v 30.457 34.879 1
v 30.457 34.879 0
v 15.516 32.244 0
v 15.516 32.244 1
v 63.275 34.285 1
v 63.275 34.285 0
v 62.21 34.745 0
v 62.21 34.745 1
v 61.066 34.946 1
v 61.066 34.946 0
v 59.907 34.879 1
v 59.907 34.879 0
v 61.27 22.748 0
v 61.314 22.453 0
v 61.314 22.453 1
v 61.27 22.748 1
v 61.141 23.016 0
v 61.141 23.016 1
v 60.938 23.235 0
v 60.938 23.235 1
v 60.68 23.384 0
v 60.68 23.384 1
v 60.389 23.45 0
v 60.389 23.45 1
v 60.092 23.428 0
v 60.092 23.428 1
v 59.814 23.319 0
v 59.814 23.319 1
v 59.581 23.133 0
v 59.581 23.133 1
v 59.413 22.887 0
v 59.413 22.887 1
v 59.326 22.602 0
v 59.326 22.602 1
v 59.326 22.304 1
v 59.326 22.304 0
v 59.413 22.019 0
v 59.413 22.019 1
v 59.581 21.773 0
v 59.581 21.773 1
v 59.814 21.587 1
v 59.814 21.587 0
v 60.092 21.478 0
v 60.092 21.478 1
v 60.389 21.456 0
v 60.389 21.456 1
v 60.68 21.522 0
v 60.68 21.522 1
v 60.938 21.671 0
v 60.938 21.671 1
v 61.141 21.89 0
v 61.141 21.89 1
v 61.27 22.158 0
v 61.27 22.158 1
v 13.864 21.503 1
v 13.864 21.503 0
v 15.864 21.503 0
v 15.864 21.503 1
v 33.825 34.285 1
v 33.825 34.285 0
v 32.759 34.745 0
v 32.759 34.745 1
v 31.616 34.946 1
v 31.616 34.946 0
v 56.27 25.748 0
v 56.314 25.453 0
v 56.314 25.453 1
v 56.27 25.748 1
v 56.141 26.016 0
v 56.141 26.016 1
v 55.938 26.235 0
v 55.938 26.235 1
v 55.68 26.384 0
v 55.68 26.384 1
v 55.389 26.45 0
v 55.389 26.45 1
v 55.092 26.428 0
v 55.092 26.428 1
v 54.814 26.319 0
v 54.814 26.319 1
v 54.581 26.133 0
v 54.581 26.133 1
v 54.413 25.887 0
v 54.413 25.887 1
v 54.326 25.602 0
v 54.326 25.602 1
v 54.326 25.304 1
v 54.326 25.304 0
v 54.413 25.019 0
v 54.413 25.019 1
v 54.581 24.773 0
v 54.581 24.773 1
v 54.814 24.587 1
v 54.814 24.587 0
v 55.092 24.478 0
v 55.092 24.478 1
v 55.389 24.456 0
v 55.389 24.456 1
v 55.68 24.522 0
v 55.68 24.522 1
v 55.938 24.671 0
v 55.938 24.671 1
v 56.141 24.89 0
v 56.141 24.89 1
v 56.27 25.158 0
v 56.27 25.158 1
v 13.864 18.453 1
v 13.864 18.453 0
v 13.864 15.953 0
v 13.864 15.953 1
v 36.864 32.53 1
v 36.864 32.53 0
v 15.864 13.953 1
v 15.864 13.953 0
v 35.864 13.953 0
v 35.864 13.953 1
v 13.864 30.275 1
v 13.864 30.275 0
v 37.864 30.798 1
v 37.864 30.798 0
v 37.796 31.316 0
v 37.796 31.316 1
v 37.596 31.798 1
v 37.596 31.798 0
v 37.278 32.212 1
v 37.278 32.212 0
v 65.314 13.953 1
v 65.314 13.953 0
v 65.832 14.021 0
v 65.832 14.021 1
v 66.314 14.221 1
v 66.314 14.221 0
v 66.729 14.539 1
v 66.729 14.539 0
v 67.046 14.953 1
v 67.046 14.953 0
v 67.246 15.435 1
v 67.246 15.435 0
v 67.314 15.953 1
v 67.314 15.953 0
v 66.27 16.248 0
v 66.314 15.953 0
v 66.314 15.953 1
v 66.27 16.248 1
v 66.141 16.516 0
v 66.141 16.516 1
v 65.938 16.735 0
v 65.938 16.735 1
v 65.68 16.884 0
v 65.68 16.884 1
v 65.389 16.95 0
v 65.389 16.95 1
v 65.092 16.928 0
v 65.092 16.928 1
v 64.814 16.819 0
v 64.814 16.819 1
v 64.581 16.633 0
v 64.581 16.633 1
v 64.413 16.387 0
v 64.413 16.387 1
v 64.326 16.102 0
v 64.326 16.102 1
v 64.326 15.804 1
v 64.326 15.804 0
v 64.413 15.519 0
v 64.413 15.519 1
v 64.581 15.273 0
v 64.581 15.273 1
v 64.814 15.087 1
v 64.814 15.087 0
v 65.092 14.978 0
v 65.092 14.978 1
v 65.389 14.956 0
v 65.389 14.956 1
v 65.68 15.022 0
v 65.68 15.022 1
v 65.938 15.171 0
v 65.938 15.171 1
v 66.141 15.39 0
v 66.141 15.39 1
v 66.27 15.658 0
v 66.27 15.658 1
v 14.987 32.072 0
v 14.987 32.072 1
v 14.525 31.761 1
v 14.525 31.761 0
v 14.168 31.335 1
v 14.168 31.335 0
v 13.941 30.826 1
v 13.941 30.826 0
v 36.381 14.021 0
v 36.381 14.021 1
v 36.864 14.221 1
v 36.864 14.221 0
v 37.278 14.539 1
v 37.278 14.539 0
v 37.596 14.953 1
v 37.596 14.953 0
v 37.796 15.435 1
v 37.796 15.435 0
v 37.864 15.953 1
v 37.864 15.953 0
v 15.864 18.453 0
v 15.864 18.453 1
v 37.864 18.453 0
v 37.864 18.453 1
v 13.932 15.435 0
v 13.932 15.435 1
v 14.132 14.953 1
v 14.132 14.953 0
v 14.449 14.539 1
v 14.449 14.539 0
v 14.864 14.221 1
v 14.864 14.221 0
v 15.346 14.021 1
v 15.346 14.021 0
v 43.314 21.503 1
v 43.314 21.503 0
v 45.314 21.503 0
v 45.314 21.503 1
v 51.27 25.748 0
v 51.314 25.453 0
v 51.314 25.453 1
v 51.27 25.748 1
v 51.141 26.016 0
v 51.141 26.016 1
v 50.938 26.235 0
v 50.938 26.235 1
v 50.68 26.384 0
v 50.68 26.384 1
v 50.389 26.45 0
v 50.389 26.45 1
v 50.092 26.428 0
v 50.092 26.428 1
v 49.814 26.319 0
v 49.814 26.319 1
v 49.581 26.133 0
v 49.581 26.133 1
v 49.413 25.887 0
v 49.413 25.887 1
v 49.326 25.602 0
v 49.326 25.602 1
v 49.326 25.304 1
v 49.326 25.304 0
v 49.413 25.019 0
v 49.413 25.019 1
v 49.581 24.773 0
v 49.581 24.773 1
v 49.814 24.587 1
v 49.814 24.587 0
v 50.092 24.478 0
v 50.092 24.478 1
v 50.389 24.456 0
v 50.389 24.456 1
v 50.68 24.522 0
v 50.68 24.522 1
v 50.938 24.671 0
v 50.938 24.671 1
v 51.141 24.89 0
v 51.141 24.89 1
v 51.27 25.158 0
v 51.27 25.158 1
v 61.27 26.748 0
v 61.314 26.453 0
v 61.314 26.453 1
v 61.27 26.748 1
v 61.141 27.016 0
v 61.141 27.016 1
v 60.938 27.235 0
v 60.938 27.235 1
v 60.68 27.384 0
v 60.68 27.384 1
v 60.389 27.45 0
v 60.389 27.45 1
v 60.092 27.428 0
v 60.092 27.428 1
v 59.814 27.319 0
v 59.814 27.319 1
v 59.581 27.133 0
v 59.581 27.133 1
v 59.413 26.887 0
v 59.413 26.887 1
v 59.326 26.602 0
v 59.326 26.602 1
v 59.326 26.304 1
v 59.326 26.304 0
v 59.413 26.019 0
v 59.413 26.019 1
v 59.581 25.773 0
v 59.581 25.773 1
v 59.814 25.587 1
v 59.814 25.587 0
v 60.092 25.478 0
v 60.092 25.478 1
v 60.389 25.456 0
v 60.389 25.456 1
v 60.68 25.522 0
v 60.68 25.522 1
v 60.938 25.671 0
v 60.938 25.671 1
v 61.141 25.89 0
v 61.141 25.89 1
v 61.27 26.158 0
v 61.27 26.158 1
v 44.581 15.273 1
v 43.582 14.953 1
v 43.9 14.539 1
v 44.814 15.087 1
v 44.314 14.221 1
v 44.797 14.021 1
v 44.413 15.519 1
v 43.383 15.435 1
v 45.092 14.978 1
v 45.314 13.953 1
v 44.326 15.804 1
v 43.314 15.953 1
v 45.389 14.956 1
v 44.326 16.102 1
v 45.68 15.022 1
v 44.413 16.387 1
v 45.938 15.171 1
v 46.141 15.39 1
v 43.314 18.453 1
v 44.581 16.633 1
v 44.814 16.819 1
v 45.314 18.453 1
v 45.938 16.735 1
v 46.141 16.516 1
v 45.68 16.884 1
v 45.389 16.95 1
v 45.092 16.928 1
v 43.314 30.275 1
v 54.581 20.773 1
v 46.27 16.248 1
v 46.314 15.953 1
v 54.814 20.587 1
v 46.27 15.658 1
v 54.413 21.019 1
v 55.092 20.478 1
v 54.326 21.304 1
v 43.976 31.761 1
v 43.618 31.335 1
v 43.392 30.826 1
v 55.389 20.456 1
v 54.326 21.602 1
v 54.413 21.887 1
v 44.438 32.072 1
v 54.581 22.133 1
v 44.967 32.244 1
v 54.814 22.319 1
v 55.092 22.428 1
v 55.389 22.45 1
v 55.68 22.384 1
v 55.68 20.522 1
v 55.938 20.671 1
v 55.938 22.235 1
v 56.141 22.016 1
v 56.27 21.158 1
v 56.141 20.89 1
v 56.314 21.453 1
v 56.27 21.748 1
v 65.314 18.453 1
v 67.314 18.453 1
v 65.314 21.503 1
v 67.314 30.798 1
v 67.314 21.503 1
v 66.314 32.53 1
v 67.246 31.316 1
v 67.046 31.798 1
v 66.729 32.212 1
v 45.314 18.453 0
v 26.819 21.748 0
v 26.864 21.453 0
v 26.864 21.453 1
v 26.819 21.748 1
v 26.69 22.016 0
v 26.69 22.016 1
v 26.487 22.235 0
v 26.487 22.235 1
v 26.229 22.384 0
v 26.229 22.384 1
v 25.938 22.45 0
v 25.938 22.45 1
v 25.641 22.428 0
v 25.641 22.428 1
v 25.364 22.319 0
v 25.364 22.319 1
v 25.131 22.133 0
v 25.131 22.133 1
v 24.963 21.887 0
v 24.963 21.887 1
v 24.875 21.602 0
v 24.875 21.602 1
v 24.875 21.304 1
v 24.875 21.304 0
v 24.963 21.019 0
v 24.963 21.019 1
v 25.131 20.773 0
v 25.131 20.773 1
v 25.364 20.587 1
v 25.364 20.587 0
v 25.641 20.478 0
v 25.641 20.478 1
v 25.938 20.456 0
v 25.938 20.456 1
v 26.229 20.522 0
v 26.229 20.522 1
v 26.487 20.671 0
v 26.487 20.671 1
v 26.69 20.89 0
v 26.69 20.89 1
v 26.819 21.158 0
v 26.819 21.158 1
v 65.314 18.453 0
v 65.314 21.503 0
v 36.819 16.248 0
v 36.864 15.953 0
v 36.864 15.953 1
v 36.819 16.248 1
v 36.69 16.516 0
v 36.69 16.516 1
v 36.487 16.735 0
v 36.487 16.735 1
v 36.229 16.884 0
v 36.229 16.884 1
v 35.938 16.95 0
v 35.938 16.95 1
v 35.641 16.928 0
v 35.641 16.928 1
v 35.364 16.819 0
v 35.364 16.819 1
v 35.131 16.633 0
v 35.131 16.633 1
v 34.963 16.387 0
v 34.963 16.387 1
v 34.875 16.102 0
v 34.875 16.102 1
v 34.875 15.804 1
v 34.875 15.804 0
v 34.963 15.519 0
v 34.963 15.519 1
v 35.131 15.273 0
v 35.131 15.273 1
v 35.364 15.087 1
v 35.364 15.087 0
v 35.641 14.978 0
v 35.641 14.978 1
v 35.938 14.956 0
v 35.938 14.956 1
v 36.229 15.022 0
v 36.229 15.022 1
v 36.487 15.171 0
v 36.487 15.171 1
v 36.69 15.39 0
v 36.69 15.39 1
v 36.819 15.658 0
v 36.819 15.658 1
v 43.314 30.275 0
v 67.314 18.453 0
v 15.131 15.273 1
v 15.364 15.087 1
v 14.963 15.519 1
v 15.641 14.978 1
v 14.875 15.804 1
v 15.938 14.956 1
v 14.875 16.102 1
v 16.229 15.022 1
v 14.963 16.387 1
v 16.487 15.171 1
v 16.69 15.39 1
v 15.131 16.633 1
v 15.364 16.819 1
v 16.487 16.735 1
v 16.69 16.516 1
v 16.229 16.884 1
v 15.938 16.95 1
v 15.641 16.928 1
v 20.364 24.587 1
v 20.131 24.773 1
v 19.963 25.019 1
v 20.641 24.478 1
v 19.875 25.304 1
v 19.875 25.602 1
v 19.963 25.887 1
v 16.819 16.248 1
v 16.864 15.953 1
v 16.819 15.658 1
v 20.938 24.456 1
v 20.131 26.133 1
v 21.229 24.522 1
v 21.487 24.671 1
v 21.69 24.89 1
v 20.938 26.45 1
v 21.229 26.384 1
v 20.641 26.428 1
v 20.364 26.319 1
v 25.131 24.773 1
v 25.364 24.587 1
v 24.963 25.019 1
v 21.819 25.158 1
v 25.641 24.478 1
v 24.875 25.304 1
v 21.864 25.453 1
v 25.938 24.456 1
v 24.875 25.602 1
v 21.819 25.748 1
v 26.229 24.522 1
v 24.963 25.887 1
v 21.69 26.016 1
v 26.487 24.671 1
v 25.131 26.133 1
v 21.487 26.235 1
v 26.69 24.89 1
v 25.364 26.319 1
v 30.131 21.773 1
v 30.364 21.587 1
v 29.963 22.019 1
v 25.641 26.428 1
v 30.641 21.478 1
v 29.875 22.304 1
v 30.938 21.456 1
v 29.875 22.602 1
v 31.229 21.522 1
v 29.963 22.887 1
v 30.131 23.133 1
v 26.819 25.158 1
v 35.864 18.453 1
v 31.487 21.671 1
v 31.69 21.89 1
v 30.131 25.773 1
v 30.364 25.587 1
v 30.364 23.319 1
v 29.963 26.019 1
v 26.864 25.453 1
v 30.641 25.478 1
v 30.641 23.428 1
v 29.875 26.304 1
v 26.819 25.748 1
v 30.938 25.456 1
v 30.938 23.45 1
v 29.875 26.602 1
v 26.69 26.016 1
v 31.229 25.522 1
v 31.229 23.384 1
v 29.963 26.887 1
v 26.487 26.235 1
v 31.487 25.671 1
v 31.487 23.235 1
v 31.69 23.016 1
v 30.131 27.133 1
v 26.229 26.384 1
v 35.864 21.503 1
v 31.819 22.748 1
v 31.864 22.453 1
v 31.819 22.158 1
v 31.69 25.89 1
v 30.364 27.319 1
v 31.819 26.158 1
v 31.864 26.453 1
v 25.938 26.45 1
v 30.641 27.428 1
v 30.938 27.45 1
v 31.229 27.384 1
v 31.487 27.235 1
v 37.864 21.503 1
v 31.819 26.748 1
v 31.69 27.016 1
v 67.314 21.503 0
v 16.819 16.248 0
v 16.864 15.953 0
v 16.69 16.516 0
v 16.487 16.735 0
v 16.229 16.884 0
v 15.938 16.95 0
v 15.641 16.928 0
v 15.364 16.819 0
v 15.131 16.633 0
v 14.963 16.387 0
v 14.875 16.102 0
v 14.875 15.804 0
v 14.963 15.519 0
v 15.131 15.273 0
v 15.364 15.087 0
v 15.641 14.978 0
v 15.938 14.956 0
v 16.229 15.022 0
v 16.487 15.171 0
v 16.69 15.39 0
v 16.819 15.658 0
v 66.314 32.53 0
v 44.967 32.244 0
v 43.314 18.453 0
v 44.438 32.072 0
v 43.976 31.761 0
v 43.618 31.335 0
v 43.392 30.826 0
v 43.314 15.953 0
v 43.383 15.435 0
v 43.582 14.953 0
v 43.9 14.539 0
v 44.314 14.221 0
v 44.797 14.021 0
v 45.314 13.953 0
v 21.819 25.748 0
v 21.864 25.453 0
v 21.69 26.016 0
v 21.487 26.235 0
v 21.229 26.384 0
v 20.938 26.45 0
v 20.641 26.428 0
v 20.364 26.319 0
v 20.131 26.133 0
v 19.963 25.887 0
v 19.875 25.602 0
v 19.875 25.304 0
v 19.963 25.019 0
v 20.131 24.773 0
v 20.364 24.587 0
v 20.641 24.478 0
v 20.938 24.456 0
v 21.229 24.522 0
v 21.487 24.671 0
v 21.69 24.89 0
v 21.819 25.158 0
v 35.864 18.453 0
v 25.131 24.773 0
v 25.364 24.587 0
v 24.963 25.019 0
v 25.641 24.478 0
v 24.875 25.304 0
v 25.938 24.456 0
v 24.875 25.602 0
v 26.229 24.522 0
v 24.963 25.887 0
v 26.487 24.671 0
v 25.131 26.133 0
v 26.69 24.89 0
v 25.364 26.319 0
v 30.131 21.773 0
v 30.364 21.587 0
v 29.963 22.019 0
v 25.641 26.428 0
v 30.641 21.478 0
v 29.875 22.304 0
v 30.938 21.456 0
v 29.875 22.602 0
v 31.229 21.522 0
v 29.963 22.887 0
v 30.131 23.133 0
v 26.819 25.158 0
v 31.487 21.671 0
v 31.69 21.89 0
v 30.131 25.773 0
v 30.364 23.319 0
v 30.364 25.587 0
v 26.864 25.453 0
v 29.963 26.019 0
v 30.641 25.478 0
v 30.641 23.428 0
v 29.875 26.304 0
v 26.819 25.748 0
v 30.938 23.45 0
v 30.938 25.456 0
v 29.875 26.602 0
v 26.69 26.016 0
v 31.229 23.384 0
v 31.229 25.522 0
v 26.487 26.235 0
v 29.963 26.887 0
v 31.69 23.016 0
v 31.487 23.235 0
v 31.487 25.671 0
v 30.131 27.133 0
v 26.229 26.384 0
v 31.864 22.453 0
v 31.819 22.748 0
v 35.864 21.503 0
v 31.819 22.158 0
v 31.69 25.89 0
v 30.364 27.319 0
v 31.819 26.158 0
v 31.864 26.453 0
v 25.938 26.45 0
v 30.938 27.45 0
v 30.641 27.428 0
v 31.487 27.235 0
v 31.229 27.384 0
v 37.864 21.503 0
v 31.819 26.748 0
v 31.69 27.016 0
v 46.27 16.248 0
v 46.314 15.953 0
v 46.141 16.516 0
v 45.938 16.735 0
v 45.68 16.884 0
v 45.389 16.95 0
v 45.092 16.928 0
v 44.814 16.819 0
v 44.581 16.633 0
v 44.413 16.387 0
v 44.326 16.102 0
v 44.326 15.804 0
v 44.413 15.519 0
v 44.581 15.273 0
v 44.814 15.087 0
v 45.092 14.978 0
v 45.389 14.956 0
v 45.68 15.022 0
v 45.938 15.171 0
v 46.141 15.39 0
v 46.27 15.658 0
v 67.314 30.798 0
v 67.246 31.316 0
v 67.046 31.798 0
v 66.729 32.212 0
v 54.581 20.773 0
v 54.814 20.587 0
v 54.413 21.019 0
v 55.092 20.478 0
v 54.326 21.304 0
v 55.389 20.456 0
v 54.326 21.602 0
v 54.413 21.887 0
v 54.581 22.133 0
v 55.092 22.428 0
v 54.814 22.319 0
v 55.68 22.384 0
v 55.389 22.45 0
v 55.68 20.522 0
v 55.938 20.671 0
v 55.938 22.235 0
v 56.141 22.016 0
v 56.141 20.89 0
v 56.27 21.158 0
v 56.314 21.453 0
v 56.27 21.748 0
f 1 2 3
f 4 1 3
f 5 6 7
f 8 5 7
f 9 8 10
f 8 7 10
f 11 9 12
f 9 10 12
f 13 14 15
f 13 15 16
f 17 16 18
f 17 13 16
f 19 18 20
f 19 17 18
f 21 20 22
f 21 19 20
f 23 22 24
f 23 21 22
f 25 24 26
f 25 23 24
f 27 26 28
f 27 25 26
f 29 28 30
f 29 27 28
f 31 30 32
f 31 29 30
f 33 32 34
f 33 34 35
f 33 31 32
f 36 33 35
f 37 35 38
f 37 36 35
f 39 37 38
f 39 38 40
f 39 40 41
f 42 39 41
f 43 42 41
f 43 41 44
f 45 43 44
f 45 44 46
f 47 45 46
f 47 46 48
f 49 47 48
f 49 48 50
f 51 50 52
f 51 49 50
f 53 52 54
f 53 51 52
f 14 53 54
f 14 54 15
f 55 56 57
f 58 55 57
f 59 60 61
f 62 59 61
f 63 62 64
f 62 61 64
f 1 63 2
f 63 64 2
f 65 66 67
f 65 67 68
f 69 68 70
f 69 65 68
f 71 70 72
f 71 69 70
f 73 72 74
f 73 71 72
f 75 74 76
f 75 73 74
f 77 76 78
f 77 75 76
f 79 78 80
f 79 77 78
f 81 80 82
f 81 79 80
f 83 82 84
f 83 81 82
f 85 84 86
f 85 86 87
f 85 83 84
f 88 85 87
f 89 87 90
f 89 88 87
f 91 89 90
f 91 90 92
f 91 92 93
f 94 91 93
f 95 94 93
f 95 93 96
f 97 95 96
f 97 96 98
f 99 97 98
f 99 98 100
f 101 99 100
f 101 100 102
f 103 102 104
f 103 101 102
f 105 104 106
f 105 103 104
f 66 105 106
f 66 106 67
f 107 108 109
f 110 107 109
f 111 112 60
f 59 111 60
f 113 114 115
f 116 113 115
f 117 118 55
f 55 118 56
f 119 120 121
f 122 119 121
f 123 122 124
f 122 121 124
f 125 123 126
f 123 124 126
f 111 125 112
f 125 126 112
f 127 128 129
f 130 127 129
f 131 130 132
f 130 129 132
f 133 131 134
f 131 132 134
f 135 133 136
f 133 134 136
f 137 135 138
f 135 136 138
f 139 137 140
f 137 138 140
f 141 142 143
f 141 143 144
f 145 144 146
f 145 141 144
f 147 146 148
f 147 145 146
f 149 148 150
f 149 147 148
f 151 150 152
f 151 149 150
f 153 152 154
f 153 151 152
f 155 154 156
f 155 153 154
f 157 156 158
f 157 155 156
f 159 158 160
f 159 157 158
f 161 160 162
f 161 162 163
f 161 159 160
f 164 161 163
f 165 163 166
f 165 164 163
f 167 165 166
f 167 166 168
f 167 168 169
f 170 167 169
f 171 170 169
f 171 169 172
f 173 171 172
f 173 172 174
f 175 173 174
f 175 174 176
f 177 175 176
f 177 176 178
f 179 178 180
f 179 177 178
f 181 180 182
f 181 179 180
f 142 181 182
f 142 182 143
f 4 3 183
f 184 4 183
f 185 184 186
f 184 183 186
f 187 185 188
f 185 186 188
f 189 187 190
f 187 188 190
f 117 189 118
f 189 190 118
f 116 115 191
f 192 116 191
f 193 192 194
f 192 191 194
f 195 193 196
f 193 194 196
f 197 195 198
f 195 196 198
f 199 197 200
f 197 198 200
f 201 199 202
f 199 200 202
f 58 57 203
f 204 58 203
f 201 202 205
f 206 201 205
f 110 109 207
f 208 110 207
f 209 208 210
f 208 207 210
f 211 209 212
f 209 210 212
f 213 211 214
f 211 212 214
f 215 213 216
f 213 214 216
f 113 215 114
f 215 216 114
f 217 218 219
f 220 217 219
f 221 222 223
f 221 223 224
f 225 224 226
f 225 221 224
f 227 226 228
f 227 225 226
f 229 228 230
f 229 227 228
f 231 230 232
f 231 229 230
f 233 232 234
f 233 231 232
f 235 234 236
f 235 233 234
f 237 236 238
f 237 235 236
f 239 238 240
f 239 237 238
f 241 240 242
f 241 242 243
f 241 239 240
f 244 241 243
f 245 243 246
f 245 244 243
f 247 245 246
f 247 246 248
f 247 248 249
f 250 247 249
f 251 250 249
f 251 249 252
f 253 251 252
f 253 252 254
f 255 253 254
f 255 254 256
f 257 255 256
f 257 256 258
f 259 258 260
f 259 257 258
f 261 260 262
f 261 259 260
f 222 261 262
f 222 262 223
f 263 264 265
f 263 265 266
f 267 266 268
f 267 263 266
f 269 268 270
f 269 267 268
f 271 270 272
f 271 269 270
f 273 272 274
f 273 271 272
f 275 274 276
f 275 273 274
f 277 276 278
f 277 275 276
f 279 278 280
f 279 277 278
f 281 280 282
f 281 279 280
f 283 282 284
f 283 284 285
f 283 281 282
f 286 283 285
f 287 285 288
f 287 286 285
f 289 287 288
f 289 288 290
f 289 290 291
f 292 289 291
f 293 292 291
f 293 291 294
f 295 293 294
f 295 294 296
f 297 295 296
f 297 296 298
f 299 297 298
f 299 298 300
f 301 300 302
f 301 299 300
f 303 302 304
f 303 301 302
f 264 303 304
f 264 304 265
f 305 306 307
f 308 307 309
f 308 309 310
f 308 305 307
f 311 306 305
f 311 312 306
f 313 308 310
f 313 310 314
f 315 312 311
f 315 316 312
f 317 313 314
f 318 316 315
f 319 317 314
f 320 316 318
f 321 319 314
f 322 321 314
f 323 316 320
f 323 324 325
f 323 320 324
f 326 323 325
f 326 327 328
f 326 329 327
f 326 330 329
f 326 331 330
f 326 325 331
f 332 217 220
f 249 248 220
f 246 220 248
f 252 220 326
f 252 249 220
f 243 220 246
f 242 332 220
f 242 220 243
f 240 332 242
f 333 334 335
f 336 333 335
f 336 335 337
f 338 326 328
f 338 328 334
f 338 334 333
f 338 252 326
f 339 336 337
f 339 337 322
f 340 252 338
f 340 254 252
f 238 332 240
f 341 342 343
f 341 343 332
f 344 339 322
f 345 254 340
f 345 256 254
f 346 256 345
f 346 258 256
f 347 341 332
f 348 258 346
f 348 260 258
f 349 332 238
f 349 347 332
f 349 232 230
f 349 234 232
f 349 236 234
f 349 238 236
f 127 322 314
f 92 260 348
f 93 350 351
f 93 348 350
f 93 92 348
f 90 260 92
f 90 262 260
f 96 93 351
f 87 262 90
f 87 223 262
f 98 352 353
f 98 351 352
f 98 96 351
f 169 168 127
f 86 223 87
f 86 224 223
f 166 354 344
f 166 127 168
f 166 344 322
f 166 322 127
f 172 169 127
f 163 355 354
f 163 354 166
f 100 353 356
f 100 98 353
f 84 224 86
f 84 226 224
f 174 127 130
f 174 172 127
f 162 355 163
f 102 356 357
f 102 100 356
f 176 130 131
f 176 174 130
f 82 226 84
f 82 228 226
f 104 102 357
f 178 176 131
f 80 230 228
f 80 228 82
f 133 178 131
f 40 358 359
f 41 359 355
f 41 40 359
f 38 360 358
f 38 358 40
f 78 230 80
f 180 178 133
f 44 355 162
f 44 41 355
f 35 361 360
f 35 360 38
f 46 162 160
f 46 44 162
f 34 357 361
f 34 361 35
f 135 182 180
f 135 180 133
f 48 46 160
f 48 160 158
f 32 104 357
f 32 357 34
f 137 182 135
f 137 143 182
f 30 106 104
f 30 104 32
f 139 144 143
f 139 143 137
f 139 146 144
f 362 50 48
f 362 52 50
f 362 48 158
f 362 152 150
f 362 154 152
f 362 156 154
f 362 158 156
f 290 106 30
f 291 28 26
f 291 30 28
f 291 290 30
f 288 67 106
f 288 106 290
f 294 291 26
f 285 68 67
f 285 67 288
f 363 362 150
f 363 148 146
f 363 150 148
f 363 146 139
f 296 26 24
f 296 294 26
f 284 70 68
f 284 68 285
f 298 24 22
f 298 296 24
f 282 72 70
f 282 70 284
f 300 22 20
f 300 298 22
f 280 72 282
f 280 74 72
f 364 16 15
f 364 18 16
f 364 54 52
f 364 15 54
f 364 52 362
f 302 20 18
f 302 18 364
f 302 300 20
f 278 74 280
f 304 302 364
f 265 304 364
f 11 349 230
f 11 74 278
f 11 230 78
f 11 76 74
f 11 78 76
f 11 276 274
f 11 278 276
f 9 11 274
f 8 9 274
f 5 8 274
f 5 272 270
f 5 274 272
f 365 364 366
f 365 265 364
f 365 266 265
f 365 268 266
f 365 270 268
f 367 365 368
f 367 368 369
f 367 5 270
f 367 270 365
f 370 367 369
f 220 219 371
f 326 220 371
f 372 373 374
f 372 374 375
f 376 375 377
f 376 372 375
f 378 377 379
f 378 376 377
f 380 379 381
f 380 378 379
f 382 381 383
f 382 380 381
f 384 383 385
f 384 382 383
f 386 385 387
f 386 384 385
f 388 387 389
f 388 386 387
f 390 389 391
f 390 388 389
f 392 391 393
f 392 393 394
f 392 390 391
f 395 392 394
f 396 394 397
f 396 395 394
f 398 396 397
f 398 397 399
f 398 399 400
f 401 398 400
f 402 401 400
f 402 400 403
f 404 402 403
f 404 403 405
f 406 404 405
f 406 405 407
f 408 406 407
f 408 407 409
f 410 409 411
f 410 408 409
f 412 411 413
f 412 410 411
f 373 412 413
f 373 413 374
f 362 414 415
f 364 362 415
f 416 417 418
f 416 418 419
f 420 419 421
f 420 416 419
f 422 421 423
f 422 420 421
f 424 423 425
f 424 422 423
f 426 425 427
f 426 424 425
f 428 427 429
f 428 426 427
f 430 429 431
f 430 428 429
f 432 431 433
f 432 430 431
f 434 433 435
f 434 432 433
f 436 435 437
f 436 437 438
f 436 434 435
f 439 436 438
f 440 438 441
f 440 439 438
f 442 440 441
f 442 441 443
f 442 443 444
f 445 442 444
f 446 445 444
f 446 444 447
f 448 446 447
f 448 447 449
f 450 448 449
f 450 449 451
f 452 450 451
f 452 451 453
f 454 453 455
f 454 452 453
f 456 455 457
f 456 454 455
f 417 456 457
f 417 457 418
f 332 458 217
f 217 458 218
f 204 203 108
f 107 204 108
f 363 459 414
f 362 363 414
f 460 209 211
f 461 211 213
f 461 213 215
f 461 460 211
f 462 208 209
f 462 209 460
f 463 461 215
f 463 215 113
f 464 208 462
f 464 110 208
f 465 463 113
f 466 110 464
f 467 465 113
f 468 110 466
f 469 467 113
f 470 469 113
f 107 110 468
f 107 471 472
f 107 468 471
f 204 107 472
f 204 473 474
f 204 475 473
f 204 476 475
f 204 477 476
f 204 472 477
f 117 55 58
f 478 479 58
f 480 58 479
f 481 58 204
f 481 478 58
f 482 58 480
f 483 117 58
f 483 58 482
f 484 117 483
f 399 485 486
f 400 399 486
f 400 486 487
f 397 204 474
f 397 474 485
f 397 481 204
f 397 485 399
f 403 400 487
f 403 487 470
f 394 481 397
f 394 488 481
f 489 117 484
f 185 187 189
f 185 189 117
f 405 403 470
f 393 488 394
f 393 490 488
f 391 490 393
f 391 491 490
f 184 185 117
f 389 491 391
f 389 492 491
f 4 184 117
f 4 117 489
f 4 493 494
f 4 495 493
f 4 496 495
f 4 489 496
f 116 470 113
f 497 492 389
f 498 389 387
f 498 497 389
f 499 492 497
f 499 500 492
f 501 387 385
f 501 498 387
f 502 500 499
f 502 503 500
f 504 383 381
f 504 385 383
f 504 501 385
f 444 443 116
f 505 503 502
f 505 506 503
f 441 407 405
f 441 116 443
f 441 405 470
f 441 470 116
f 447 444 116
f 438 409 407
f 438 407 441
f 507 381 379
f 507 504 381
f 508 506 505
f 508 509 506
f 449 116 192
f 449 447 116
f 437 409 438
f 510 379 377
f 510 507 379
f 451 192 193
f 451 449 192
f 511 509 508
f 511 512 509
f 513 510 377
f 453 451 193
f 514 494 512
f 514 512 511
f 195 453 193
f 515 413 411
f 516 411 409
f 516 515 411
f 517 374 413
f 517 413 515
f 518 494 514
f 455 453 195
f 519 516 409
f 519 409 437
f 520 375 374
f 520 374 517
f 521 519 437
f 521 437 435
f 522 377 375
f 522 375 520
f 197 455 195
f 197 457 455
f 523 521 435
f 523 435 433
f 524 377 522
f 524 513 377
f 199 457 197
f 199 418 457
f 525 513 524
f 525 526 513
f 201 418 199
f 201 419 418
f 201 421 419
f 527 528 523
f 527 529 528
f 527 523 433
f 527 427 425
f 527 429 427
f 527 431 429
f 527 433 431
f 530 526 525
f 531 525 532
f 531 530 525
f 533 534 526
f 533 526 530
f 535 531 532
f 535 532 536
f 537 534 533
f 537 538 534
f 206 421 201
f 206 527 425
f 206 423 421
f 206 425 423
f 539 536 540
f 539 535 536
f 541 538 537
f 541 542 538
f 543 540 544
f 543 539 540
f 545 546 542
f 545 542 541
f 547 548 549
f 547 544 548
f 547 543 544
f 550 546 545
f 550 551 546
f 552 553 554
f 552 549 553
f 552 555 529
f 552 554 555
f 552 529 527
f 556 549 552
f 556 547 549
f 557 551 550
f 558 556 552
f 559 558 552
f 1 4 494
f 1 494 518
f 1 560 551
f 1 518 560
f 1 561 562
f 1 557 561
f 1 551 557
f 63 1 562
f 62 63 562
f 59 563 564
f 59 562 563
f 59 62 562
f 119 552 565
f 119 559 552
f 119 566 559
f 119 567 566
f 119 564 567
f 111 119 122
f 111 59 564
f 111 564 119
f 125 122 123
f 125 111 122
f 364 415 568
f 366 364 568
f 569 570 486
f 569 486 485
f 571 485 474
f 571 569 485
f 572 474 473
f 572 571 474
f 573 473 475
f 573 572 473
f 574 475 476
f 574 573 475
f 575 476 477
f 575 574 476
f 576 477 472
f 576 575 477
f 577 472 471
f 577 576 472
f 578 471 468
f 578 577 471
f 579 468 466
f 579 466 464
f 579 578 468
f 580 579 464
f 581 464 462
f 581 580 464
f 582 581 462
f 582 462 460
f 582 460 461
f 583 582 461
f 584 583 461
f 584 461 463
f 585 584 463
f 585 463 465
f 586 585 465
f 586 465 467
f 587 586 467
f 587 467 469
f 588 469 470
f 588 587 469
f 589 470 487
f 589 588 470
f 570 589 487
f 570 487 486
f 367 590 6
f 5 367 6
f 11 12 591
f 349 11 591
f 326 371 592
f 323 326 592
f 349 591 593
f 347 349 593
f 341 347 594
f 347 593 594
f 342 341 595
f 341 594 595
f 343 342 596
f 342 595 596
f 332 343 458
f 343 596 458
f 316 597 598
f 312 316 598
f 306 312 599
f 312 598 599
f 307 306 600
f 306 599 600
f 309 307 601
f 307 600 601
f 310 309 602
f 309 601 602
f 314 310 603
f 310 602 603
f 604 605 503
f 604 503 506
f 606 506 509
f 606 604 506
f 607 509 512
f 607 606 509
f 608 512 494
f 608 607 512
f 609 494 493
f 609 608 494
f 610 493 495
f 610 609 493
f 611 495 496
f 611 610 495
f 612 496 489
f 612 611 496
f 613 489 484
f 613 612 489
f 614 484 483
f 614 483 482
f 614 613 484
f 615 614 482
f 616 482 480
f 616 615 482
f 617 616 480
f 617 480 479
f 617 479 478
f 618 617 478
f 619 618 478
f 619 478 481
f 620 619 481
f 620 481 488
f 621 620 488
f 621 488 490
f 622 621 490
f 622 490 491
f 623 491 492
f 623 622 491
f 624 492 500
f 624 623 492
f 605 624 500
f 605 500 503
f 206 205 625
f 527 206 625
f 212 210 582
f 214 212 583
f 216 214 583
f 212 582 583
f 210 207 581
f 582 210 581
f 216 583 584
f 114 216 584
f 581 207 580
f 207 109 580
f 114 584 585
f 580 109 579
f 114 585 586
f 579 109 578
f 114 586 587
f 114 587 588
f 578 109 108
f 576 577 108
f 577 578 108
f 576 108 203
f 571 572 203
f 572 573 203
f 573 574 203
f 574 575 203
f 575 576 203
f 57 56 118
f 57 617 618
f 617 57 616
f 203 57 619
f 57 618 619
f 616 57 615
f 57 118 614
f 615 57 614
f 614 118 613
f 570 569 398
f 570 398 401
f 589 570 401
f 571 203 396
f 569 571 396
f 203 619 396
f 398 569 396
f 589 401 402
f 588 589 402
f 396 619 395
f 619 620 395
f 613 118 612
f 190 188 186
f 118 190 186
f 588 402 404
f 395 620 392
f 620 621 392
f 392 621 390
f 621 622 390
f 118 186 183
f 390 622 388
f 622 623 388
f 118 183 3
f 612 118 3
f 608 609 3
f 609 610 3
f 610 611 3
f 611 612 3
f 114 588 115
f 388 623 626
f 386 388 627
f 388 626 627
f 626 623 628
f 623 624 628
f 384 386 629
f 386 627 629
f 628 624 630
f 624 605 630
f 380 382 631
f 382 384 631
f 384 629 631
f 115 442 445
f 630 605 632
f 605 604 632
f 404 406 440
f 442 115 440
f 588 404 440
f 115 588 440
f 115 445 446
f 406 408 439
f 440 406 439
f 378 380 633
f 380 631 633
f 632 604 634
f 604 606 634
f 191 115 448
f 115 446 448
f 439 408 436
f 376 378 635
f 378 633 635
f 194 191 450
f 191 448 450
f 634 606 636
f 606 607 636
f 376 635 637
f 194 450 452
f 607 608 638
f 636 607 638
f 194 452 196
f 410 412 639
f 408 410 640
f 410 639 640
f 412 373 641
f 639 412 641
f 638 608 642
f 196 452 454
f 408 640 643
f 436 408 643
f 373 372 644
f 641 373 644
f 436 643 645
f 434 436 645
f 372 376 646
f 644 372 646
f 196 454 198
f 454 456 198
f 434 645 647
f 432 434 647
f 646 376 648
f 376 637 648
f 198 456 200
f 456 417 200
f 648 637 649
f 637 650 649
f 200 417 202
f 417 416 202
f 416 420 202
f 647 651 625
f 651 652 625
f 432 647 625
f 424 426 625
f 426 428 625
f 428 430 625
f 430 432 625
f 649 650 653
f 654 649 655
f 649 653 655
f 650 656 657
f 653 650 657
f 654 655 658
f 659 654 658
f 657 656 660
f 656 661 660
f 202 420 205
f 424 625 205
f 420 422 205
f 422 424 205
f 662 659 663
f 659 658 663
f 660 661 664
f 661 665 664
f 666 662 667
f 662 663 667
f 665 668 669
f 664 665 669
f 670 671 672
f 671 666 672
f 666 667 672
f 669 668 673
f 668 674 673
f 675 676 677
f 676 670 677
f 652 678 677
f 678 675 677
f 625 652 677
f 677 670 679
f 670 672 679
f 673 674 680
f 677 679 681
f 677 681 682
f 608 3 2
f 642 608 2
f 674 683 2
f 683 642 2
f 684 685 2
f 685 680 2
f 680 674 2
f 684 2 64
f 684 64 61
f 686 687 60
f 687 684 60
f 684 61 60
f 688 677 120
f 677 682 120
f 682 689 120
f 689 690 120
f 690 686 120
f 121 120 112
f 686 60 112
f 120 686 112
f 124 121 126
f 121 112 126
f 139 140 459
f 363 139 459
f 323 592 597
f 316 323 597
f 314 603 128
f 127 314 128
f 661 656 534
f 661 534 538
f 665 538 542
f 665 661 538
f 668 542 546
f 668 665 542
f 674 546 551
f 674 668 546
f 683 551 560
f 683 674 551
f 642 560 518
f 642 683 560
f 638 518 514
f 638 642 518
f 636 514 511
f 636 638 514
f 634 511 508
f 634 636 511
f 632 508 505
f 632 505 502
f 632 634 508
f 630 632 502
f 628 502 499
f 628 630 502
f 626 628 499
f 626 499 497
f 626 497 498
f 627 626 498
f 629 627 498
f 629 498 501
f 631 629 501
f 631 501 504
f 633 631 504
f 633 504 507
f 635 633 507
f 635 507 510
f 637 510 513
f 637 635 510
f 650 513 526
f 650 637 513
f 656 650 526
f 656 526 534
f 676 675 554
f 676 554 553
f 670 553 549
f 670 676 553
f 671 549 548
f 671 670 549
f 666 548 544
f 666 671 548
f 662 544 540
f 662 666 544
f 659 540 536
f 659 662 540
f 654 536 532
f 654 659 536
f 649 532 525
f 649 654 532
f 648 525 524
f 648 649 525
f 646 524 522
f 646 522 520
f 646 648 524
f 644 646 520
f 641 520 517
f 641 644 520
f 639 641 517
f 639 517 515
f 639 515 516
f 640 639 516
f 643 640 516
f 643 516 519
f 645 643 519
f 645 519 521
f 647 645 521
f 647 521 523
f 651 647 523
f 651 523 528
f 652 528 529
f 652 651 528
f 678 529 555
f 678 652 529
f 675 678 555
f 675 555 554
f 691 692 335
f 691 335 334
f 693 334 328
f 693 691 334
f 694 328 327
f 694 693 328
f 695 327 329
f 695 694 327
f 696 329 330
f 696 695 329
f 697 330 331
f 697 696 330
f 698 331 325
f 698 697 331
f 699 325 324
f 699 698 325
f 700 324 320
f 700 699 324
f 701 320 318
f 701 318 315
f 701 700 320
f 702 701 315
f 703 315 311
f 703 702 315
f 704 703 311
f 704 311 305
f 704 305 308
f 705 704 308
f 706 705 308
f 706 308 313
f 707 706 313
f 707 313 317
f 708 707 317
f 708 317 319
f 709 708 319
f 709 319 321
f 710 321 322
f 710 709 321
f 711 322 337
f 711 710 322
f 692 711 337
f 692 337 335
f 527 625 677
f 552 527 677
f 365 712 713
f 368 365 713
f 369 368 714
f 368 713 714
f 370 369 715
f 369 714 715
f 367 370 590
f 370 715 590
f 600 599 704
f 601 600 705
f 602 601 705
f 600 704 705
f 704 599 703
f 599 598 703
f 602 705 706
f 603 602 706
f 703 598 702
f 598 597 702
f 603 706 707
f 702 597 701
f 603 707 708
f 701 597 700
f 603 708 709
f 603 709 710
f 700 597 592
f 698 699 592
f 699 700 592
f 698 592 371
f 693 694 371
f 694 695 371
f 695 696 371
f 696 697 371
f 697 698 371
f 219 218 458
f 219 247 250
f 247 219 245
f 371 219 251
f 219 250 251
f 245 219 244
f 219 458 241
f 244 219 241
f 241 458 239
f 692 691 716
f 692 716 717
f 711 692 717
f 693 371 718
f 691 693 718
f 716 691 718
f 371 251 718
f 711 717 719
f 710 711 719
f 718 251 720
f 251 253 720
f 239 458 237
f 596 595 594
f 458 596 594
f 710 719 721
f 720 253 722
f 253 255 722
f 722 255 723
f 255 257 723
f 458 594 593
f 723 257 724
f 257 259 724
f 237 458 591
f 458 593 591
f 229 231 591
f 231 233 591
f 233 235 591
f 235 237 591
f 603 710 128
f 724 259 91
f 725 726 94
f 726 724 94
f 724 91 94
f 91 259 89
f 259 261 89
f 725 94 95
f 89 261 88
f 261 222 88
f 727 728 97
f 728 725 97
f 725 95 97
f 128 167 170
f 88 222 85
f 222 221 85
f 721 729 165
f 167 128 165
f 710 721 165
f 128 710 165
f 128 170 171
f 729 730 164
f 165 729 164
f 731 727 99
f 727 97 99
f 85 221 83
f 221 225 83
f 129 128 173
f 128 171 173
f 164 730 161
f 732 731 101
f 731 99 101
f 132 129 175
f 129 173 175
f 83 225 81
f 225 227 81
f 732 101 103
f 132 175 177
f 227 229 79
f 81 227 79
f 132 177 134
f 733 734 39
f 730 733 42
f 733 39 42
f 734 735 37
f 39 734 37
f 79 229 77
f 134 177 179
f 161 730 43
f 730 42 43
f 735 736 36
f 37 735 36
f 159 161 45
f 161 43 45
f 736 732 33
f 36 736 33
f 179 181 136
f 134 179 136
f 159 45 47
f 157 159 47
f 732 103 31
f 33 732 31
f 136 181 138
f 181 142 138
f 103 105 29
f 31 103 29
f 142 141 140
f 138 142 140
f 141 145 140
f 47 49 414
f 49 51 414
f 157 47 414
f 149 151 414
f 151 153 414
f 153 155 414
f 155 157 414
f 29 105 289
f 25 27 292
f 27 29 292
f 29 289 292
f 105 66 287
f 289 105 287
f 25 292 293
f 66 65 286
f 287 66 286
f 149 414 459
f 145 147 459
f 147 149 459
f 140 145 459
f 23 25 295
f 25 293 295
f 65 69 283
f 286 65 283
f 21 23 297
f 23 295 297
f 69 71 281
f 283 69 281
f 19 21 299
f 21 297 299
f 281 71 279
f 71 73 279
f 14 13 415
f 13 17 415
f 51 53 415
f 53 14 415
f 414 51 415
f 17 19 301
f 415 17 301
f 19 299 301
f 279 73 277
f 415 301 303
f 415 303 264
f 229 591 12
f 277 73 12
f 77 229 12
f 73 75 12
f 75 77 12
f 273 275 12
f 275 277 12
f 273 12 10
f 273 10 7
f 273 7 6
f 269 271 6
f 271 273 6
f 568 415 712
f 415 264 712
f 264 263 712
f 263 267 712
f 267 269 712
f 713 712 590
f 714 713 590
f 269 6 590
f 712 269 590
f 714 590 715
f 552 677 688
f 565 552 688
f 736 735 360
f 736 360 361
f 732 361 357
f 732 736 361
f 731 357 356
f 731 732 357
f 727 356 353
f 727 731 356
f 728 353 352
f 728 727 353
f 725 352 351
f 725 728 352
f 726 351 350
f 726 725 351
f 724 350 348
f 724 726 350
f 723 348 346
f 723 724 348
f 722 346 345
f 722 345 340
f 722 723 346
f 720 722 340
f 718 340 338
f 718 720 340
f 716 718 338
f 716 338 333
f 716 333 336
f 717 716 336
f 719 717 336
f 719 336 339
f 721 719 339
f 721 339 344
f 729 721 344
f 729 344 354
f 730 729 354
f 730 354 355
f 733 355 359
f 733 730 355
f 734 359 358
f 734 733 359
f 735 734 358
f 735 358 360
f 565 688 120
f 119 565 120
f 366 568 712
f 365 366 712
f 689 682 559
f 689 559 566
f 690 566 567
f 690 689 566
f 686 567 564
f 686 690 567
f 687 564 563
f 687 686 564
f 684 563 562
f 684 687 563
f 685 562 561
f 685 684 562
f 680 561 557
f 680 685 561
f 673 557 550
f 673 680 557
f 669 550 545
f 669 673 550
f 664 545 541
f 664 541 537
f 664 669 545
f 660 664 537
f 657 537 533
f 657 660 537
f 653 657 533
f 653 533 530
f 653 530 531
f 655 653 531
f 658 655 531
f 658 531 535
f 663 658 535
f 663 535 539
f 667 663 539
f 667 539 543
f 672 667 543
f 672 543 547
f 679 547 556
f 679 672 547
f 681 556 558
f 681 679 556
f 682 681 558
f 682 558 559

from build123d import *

# Parameters (mm, degrees)
MODEL_R           = 1
EXTRUDE_1_DEPTH   = 1
EXTRUDE_1_2_DEPTH = 1


with BuildPart() as part:
    # Model → 凸台-拉伸1 (new body)
    with BuildSketch(Plane.XY):
        with BuildLine():
            Line((37.863680869, 15.952895964), (37.863680869, 18.452895964))
            Line((37.863680869, 18.452895964), (35.863680869, 18.452895964))
            Line((35.863680869, 18.452895964), (35.863680869, 21.452895994))
            Line((35.863680869, 21.452895994), (35.863680869, 21.502895994))
            Line((35.863680869, 21.502895994), (37.863680869, 21.502895994))
            Line((37.863680869, 21.502895994), (37.863680869, 30.798195426))
            ThreePointArc((37.863680869, 30.798195426), (37.595731677, 31.798195426), (36.863680869, 32.530246234))
            Line((36.863680869, 32.530246234), (33.82478485, 34.284753669))
            ThreePointArc((33.82478485, 34.284753669), (32.193025738, 34.878665415), (30.456543961, 34.878665415))
            Line((30.456543961, 34.878665415), (15.516384514, 32.244312208))
            ThreePointArc((15.516384514, 32.244312208), (14.331591983, 31.560271922), (13.863680869, 30.274696702))
            Line((13.863680869, 30.274696702), (13.863680869, 21.502895994))
            Line((13.863680869, 21.502895994), (15.863680869, 21.502895994))
            Line((15.863680869, 21.502895994), (15.863680869, 21.452895994))
            Line((15.863680869, 21.452895994), (15.863680869, 18.452895964))
            Line((15.863680869, 18.452895964), (13.863680869, 18.452895964))
            Line((13.863680869, 18.452895964), (13.863680869, 15.952895964))
            ThreePointArc((13.863680869, 15.952895964), (14.449467307, 14.538682402), (15.863680869, 13.952895964))
            Line((15.863680869, 13.952895964), (35.863680869, 13.952895964))
            ThreePointArc((35.863680869, 13.952895964), (37.277894432, 14.538682402), (37.863680869, 15.952895964))
        make_face()
        with Locations((35.863680869, 15.952895964)):
            Circle(MODEL_R, mode=Mode.SUBTRACT)
        with Locations((15.863680869, 15.952895964)):
            Circle(MODEL_R, mode=Mode.SUBTRACT)
        with Locations((25.863680869, 25.452895979)):
            Circle(MODEL_R, mode=Mode.SUBTRACT)
        with Locations((20.863680869, 25.452895979)):
            Circle(MODEL_R, mode=Mode.SUBTRACT)
        with Locations((30.863680869, 26.452895979)):
            Circle(MODEL_R, mode=Mode.SUBTRACT)
        with Locations((25.863680869, 21.452895979)):
            Circle(MODEL_R, mode=Mode.SUBTRACT)
        with Locations((30.863680869, 22.452895979)):
            Circle(MODEL_R, mode=Mode.SUBTRACT)
    extrude(amount=EXTRUDE_1_DEPTH)


with BuildPart() as body_2:
    # Model → Extrude 1 2 (new body)
    with BuildSketch(Plane.XY):
        with BuildLine():
            Line((67.314390859, 15.952895964), (67.314390859, 18.452895964))
            Line((67.314390859, 18.452895964), (65.314390859, 18.452895964))
            Line((65.314390859, 18.452895964), (65.314390859, 21.452895994))
            Line((65.314390859, 21.452895994), (65.314390859, 21.502895994))
            Line((65.314390859, 21.502895994), (67.314390859, 21.502895994))
            Line((67.314390859, 21.502895994), (67.314390859, 30.798195426))
            ThreePointArc((67.314390859, 30.798195426), (67.046441666, 31.798195426), (66.314390859, 32.530246234))
            Line((66.314390859, 32.530246234), (63.275494839, 34.284753669))
            ThreePointArc((63.275494839, 34.284753669), (61.643735727, 34.878665415), (59.907253951, 34.878665415))
            Line((59.907253951, 34.878665415), (44.967094503, 32.244312208))
            ThreePointArc((44.967094503, 32.244312208), (43.782301973, 31.560271922), (43.314390859, 30.274696702))
            Line((43.314390859, 30.274696702), (43.314390859, 21.502895994))
            Line((43.314390859, 21.502895994), (45.314390859, 21.502895994))
            Line((45.314390859, 21.502895994), (45.314390859, 21.452895994))
            Line((45.314390859, 21.452895994), (45.314390859, 18.452895964))
            Line((45.314390859, 18.452895964), (43.314390859, 18.452895964))
            Line((43.314390859, 18.452895964), (43.314390859, 15.952895964))
            ThreePointArc((43.314390859, 15.952895964), (43.900177296, 14.538682402), (45.314390859, 13.952895964))
            Line((45.314390859, 13.952895964), (65.314390859, 13.952895964))
            ThreePointArc((65.314390859, 13.952895964), (66.728604421, 14.538682402), (67.314390859, 15.952895964))
        make_face()
        with Locations((65.314390859, 15.952895964)):
            Circle(MODEL_R, mode=Mode.SUBTRACT)
        with Locations((45.314390859, 15.952895964)):
            Circle(MODEL_R, mode=Mode.SUBTRACT)
        with Locations((55.314390859, 25.452895979)):
            Circle(MODEL_R, mode=Mode.SUBTRACT)
        with Locations((50.314390859, 25.452895979)):
            Circle(MODEL_R, mode=Mode.SUBTRACT)
        with Locations((60.314390859, 26.452895979)):
            Circle(MODEL_R, mode=Mode.SUBTRACT)
        with Locations((55.314390859, 21.452895979)):
            Circle(MODEL_R, mode=Mode.SUBTRACT)
        with Locations((60.314390859, 22.452895979)):
            Circle(MODEL_R, mode=Mode.SUBTRACT)
    extrude(amount=EXTRUDE_1_2_DEPTH)


solid = Compound([part.part, body_2.part])
